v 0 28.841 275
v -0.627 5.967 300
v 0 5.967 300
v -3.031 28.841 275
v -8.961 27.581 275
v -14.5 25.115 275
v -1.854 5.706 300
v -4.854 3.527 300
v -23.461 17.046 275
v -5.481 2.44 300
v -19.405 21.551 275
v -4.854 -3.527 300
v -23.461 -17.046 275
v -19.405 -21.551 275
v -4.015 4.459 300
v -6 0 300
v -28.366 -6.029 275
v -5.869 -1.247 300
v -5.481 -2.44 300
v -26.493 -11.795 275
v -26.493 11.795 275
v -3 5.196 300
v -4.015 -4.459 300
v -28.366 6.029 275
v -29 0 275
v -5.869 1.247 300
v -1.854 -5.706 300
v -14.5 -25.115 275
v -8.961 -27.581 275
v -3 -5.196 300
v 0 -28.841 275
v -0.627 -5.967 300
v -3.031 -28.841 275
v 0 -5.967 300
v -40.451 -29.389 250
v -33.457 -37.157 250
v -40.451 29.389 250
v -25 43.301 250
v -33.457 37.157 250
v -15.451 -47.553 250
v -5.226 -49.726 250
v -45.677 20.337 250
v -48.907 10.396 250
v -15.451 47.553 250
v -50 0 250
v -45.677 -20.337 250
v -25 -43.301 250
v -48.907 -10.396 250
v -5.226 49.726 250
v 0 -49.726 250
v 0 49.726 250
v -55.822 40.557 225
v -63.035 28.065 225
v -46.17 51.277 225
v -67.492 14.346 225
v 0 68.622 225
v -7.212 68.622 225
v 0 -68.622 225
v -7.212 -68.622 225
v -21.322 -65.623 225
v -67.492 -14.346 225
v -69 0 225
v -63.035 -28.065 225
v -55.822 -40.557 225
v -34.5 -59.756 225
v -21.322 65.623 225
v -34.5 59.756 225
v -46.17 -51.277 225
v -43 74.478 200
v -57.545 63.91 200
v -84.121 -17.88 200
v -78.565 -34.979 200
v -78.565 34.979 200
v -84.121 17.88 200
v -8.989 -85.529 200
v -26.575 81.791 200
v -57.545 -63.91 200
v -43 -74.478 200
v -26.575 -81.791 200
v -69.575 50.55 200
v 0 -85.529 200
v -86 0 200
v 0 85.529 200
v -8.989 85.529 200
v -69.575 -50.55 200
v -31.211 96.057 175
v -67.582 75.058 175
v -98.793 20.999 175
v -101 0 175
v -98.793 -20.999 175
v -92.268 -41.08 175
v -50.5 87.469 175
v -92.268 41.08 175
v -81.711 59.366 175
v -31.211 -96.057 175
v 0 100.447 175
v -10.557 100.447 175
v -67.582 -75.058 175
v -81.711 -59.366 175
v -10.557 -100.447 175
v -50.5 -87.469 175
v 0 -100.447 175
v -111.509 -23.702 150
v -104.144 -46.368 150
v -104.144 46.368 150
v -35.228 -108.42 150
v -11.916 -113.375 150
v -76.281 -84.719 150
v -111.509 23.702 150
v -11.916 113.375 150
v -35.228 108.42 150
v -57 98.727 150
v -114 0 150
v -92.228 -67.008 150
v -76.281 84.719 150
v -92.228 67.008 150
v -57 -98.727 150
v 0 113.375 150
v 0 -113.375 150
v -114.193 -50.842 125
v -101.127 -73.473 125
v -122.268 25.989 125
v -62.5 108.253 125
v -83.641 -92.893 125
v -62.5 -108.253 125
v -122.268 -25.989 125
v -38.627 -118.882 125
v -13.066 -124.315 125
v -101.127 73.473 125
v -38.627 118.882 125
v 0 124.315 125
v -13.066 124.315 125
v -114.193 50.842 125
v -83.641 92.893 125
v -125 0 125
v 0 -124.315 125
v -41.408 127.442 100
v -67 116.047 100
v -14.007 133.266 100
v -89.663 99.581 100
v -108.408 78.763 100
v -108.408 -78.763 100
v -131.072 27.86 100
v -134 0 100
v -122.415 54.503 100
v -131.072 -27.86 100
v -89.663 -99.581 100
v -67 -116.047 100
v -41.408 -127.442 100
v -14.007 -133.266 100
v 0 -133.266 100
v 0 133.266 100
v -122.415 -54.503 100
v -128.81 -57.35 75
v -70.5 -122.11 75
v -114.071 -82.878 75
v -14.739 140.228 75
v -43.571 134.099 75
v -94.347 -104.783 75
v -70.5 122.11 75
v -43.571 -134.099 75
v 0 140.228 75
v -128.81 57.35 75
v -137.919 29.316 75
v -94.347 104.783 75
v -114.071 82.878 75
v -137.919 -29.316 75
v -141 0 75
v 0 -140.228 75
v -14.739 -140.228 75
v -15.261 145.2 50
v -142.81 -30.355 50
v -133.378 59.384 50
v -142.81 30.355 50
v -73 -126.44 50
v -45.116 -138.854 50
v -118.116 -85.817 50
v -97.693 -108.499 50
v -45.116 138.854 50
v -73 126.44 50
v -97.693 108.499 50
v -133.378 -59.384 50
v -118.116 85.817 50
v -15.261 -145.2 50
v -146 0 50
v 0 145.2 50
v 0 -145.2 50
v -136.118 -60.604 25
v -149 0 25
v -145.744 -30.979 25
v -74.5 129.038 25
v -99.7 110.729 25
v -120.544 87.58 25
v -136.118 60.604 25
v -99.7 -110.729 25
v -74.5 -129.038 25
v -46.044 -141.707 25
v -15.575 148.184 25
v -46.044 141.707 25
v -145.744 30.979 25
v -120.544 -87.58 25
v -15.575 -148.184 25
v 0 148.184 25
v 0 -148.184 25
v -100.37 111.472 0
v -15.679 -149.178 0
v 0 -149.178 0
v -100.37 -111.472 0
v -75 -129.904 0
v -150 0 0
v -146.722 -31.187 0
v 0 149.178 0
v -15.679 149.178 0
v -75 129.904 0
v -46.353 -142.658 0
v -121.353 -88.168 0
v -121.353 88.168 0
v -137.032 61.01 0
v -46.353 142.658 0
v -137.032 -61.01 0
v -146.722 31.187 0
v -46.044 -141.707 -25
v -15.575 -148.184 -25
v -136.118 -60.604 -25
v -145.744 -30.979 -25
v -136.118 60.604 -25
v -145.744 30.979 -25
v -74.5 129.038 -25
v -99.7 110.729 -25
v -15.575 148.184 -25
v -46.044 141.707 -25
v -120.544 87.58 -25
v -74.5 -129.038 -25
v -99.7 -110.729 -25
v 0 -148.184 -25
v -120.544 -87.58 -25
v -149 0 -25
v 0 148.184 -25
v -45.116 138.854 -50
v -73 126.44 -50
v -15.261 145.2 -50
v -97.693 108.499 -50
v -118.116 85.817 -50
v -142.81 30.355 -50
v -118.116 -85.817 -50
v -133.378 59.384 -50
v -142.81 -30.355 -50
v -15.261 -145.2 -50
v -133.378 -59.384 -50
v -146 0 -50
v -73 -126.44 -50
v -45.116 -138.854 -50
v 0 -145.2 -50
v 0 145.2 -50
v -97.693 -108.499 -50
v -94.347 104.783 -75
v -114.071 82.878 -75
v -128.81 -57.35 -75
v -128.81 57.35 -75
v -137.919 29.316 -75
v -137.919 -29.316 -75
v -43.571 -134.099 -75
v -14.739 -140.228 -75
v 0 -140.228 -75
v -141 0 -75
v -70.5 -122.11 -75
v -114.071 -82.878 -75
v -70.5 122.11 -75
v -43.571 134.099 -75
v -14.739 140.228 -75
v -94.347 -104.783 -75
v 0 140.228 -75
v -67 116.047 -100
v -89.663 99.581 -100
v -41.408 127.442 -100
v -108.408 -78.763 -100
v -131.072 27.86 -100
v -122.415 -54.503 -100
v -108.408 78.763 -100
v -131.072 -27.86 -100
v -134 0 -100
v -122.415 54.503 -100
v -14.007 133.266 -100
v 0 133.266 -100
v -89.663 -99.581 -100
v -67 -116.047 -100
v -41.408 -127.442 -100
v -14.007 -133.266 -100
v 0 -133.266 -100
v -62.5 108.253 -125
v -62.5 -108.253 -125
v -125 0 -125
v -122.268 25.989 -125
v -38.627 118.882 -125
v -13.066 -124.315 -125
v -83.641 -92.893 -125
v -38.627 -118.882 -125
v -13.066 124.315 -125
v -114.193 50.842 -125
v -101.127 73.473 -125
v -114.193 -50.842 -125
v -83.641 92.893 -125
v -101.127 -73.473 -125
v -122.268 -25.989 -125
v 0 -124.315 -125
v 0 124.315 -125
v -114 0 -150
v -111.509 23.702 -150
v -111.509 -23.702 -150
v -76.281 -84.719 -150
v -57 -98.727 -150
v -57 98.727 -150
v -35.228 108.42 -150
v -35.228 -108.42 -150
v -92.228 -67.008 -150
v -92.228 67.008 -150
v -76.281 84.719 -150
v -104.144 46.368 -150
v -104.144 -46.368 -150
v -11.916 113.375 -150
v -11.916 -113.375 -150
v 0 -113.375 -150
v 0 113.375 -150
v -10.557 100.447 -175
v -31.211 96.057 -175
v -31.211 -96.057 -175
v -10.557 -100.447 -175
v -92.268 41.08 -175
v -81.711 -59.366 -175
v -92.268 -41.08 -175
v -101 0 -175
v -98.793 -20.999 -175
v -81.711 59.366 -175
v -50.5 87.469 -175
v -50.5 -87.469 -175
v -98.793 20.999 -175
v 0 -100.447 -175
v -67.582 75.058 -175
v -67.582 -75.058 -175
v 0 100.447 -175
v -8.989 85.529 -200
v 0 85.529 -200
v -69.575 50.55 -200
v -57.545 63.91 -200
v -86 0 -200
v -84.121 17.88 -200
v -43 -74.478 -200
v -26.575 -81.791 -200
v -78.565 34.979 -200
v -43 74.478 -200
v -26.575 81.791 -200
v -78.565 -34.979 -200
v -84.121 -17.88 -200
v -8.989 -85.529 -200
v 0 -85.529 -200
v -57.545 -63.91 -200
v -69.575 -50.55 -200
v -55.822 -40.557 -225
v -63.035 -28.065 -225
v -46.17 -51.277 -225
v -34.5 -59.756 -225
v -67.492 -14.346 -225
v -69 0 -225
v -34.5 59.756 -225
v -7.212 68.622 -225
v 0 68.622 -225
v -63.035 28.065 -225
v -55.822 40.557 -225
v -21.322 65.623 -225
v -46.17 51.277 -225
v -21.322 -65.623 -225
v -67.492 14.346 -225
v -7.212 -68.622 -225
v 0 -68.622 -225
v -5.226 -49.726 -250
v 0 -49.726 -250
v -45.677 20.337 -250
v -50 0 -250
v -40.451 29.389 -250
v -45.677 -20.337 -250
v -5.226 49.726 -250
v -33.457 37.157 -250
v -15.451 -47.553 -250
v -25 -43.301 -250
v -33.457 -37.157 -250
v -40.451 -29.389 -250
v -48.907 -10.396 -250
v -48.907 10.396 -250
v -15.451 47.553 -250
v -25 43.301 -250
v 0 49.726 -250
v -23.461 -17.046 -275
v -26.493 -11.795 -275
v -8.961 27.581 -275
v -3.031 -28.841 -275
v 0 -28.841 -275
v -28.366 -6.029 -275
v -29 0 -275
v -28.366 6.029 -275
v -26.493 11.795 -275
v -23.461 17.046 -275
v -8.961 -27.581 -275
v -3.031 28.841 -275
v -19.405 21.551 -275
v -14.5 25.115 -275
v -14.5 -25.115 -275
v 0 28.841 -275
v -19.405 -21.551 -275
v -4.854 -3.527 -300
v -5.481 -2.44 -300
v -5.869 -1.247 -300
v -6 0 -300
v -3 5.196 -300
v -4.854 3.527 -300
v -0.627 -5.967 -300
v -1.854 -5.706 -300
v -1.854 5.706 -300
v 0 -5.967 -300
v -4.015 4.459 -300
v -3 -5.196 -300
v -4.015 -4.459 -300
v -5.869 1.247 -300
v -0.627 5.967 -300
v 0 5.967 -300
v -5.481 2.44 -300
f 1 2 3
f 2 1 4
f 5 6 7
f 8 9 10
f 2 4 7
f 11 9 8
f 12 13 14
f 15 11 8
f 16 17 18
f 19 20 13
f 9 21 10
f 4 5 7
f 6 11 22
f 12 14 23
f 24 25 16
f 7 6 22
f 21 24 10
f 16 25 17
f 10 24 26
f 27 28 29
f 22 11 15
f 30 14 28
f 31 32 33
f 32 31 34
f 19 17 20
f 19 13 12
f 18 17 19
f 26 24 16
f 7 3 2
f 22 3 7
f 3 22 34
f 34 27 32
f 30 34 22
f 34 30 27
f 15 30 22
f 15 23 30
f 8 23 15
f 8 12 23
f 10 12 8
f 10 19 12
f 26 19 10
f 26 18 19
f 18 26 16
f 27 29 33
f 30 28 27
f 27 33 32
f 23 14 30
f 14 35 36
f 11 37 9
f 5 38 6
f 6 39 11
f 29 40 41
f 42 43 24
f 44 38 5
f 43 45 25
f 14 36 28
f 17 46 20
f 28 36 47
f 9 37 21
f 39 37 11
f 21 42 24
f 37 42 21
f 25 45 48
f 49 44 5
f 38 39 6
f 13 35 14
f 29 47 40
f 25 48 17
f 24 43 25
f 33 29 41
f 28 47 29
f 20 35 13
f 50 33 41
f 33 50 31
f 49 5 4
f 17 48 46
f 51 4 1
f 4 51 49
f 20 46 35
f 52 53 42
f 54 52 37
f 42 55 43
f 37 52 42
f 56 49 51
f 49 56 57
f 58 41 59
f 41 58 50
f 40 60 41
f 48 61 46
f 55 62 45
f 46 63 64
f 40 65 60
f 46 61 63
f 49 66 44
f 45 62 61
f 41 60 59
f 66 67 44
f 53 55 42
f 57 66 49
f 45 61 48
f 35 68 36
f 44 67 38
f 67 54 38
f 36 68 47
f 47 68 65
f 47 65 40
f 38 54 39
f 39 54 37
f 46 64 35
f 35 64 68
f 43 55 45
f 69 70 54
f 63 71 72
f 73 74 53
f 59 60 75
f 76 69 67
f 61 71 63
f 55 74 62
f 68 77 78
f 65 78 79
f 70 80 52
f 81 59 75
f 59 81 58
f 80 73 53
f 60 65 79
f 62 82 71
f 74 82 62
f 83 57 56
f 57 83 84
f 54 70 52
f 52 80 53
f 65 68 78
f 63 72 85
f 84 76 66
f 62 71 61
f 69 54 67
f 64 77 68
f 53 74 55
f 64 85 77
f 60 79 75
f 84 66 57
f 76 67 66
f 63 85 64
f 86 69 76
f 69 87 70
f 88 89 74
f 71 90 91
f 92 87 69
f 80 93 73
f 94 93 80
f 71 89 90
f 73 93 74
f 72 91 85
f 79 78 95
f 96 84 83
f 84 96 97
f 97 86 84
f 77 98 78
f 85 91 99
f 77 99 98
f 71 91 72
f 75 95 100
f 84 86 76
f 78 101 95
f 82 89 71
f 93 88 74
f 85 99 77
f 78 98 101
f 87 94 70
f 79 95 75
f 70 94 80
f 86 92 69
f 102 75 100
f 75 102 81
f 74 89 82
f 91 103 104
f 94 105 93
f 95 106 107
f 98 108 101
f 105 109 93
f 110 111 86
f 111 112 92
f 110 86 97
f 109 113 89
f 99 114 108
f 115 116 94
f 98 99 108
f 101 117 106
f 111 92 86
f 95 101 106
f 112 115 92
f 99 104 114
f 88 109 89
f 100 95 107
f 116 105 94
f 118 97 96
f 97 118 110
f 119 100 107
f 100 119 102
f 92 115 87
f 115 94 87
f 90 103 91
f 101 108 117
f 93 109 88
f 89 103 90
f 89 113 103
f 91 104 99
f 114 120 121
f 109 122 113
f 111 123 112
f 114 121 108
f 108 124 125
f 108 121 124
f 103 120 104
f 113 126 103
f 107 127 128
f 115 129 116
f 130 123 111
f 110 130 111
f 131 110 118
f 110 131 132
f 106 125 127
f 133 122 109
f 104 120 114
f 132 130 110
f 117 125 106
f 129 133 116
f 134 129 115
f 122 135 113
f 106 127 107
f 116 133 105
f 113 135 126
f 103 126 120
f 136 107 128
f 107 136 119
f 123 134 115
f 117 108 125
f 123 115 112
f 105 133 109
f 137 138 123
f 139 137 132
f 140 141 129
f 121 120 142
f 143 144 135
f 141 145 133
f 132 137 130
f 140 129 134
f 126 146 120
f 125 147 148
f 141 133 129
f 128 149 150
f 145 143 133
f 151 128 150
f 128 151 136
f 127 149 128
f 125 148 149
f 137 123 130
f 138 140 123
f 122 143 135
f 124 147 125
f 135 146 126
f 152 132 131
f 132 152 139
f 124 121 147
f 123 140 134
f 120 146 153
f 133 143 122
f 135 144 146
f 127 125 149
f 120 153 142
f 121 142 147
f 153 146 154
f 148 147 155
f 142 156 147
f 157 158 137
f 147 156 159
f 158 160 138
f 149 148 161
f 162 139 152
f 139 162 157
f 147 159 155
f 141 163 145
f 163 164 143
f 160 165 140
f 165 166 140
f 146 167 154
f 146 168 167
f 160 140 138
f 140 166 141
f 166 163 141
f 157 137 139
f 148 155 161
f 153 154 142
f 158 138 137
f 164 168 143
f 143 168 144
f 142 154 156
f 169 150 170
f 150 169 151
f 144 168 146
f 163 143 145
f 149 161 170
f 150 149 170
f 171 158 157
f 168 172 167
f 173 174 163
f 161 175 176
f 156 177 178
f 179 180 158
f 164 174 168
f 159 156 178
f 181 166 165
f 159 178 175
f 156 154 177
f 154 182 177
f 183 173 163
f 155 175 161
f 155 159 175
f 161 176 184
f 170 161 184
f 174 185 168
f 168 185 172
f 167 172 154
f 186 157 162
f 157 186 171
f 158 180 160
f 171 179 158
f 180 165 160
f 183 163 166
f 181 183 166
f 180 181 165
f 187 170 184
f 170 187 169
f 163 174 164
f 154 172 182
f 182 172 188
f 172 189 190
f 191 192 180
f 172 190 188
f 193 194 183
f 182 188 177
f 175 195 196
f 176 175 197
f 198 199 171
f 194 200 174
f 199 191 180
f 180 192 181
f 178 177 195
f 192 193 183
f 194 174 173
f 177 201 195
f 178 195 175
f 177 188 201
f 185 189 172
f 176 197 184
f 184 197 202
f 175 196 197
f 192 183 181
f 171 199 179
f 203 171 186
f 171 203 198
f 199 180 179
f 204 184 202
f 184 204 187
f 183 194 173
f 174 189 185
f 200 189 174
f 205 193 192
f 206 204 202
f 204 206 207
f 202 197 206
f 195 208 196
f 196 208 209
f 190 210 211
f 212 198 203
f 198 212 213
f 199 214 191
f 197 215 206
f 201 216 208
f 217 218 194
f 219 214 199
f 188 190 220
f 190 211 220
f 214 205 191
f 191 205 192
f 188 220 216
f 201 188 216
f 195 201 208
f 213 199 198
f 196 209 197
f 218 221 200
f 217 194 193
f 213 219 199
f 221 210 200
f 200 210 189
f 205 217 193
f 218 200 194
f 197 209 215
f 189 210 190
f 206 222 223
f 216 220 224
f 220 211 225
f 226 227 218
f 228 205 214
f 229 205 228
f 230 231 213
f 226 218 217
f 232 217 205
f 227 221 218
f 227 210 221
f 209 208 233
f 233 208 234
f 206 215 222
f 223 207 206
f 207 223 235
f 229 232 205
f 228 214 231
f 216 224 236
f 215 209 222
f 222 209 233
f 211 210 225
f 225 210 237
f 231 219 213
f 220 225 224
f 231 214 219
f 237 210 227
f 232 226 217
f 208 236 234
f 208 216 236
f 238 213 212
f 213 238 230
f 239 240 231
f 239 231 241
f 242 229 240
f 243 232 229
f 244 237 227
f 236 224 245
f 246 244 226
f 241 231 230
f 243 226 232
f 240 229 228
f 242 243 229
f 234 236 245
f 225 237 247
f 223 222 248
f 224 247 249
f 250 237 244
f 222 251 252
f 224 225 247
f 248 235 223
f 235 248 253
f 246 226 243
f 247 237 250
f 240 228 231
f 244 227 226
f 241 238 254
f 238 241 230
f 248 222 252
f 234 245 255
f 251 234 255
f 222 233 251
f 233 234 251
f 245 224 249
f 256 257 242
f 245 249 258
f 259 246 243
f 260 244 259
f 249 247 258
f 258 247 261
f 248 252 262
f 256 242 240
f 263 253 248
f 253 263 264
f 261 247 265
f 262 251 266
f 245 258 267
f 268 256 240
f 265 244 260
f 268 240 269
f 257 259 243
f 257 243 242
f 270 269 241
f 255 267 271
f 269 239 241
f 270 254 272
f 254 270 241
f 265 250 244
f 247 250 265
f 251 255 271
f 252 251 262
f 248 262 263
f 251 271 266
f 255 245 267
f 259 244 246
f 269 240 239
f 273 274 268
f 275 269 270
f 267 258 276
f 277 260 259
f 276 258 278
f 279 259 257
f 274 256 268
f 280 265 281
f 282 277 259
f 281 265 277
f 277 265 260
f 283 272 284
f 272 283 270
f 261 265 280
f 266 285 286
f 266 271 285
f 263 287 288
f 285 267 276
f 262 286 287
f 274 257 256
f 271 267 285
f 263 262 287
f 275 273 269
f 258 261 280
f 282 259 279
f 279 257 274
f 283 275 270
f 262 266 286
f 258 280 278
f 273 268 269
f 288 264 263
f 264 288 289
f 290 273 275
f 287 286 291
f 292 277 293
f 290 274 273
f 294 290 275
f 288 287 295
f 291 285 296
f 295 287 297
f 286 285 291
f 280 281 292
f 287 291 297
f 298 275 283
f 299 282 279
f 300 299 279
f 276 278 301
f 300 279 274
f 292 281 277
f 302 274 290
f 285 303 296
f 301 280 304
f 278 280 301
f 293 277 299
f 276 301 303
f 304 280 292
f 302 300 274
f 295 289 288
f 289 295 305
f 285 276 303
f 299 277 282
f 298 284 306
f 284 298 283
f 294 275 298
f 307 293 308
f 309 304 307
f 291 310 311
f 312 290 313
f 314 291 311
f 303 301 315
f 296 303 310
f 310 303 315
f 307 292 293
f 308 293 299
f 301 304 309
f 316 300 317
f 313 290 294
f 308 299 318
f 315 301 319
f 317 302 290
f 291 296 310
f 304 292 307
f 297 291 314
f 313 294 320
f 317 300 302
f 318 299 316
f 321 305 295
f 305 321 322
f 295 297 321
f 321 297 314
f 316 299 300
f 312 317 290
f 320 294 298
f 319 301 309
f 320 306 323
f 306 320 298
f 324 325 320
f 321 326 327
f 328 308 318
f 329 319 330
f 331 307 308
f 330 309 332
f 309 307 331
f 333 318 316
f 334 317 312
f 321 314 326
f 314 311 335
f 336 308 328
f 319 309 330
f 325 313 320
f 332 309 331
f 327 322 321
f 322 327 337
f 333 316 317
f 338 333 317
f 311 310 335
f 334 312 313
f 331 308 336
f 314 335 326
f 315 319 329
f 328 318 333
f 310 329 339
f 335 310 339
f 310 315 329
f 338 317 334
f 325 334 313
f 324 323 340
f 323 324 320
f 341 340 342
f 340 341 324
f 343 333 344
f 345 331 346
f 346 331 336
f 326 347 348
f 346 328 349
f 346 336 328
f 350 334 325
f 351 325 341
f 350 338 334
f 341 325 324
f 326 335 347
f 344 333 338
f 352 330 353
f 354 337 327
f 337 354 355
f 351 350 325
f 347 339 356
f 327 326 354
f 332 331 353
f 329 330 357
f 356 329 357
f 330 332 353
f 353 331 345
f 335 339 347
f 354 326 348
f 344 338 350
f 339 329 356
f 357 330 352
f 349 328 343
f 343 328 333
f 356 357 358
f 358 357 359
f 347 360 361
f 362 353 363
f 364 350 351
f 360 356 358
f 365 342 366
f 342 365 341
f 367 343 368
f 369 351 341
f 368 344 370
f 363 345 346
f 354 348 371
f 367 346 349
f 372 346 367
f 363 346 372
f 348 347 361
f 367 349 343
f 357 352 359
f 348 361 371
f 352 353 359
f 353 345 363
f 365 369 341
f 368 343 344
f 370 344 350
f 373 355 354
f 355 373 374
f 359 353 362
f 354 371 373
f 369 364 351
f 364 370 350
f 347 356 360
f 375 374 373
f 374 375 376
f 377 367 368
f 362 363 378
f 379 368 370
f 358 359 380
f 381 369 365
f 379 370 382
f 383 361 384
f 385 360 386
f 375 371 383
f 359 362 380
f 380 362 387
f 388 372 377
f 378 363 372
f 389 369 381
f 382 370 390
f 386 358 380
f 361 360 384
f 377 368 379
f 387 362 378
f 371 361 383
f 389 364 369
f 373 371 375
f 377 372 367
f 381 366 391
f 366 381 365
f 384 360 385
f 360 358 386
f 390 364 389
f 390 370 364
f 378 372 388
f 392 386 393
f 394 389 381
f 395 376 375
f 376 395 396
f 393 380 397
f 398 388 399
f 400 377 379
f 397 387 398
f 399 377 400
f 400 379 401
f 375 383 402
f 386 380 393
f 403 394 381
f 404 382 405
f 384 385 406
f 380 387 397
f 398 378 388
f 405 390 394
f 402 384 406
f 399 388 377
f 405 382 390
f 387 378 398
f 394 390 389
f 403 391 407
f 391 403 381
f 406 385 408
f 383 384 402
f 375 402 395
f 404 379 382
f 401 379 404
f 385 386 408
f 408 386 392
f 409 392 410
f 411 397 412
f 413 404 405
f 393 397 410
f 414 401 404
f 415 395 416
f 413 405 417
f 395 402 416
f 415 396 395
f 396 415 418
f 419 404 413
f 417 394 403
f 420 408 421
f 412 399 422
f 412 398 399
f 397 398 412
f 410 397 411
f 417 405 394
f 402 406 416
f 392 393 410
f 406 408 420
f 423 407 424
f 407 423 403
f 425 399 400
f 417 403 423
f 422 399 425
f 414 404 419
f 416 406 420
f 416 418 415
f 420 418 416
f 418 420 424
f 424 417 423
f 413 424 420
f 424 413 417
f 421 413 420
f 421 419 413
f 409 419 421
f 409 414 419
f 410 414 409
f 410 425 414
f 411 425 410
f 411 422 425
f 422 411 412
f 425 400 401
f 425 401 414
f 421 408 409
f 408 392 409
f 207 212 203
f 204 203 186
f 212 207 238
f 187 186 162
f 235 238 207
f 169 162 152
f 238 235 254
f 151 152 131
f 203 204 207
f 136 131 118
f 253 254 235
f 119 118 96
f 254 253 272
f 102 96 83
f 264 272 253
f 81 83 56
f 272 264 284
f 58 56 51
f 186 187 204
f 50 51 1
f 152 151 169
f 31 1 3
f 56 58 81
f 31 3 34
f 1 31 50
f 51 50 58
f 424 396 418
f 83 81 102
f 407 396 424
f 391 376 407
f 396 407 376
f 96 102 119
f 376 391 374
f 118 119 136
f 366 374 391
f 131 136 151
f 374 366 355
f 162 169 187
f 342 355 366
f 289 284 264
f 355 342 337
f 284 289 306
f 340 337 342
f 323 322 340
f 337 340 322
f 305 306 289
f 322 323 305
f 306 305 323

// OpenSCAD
sectionLength=25;
difference() {
    for(i = [-12:12]) {
        translate([0,0,-i*sectionLength]) {
            cylinder(sectionLength,150-(i*i),150-((i-1)*(i-1)));
        }
    }
    translate([400,0,0]) cube(800,200,200,center=true);
}
